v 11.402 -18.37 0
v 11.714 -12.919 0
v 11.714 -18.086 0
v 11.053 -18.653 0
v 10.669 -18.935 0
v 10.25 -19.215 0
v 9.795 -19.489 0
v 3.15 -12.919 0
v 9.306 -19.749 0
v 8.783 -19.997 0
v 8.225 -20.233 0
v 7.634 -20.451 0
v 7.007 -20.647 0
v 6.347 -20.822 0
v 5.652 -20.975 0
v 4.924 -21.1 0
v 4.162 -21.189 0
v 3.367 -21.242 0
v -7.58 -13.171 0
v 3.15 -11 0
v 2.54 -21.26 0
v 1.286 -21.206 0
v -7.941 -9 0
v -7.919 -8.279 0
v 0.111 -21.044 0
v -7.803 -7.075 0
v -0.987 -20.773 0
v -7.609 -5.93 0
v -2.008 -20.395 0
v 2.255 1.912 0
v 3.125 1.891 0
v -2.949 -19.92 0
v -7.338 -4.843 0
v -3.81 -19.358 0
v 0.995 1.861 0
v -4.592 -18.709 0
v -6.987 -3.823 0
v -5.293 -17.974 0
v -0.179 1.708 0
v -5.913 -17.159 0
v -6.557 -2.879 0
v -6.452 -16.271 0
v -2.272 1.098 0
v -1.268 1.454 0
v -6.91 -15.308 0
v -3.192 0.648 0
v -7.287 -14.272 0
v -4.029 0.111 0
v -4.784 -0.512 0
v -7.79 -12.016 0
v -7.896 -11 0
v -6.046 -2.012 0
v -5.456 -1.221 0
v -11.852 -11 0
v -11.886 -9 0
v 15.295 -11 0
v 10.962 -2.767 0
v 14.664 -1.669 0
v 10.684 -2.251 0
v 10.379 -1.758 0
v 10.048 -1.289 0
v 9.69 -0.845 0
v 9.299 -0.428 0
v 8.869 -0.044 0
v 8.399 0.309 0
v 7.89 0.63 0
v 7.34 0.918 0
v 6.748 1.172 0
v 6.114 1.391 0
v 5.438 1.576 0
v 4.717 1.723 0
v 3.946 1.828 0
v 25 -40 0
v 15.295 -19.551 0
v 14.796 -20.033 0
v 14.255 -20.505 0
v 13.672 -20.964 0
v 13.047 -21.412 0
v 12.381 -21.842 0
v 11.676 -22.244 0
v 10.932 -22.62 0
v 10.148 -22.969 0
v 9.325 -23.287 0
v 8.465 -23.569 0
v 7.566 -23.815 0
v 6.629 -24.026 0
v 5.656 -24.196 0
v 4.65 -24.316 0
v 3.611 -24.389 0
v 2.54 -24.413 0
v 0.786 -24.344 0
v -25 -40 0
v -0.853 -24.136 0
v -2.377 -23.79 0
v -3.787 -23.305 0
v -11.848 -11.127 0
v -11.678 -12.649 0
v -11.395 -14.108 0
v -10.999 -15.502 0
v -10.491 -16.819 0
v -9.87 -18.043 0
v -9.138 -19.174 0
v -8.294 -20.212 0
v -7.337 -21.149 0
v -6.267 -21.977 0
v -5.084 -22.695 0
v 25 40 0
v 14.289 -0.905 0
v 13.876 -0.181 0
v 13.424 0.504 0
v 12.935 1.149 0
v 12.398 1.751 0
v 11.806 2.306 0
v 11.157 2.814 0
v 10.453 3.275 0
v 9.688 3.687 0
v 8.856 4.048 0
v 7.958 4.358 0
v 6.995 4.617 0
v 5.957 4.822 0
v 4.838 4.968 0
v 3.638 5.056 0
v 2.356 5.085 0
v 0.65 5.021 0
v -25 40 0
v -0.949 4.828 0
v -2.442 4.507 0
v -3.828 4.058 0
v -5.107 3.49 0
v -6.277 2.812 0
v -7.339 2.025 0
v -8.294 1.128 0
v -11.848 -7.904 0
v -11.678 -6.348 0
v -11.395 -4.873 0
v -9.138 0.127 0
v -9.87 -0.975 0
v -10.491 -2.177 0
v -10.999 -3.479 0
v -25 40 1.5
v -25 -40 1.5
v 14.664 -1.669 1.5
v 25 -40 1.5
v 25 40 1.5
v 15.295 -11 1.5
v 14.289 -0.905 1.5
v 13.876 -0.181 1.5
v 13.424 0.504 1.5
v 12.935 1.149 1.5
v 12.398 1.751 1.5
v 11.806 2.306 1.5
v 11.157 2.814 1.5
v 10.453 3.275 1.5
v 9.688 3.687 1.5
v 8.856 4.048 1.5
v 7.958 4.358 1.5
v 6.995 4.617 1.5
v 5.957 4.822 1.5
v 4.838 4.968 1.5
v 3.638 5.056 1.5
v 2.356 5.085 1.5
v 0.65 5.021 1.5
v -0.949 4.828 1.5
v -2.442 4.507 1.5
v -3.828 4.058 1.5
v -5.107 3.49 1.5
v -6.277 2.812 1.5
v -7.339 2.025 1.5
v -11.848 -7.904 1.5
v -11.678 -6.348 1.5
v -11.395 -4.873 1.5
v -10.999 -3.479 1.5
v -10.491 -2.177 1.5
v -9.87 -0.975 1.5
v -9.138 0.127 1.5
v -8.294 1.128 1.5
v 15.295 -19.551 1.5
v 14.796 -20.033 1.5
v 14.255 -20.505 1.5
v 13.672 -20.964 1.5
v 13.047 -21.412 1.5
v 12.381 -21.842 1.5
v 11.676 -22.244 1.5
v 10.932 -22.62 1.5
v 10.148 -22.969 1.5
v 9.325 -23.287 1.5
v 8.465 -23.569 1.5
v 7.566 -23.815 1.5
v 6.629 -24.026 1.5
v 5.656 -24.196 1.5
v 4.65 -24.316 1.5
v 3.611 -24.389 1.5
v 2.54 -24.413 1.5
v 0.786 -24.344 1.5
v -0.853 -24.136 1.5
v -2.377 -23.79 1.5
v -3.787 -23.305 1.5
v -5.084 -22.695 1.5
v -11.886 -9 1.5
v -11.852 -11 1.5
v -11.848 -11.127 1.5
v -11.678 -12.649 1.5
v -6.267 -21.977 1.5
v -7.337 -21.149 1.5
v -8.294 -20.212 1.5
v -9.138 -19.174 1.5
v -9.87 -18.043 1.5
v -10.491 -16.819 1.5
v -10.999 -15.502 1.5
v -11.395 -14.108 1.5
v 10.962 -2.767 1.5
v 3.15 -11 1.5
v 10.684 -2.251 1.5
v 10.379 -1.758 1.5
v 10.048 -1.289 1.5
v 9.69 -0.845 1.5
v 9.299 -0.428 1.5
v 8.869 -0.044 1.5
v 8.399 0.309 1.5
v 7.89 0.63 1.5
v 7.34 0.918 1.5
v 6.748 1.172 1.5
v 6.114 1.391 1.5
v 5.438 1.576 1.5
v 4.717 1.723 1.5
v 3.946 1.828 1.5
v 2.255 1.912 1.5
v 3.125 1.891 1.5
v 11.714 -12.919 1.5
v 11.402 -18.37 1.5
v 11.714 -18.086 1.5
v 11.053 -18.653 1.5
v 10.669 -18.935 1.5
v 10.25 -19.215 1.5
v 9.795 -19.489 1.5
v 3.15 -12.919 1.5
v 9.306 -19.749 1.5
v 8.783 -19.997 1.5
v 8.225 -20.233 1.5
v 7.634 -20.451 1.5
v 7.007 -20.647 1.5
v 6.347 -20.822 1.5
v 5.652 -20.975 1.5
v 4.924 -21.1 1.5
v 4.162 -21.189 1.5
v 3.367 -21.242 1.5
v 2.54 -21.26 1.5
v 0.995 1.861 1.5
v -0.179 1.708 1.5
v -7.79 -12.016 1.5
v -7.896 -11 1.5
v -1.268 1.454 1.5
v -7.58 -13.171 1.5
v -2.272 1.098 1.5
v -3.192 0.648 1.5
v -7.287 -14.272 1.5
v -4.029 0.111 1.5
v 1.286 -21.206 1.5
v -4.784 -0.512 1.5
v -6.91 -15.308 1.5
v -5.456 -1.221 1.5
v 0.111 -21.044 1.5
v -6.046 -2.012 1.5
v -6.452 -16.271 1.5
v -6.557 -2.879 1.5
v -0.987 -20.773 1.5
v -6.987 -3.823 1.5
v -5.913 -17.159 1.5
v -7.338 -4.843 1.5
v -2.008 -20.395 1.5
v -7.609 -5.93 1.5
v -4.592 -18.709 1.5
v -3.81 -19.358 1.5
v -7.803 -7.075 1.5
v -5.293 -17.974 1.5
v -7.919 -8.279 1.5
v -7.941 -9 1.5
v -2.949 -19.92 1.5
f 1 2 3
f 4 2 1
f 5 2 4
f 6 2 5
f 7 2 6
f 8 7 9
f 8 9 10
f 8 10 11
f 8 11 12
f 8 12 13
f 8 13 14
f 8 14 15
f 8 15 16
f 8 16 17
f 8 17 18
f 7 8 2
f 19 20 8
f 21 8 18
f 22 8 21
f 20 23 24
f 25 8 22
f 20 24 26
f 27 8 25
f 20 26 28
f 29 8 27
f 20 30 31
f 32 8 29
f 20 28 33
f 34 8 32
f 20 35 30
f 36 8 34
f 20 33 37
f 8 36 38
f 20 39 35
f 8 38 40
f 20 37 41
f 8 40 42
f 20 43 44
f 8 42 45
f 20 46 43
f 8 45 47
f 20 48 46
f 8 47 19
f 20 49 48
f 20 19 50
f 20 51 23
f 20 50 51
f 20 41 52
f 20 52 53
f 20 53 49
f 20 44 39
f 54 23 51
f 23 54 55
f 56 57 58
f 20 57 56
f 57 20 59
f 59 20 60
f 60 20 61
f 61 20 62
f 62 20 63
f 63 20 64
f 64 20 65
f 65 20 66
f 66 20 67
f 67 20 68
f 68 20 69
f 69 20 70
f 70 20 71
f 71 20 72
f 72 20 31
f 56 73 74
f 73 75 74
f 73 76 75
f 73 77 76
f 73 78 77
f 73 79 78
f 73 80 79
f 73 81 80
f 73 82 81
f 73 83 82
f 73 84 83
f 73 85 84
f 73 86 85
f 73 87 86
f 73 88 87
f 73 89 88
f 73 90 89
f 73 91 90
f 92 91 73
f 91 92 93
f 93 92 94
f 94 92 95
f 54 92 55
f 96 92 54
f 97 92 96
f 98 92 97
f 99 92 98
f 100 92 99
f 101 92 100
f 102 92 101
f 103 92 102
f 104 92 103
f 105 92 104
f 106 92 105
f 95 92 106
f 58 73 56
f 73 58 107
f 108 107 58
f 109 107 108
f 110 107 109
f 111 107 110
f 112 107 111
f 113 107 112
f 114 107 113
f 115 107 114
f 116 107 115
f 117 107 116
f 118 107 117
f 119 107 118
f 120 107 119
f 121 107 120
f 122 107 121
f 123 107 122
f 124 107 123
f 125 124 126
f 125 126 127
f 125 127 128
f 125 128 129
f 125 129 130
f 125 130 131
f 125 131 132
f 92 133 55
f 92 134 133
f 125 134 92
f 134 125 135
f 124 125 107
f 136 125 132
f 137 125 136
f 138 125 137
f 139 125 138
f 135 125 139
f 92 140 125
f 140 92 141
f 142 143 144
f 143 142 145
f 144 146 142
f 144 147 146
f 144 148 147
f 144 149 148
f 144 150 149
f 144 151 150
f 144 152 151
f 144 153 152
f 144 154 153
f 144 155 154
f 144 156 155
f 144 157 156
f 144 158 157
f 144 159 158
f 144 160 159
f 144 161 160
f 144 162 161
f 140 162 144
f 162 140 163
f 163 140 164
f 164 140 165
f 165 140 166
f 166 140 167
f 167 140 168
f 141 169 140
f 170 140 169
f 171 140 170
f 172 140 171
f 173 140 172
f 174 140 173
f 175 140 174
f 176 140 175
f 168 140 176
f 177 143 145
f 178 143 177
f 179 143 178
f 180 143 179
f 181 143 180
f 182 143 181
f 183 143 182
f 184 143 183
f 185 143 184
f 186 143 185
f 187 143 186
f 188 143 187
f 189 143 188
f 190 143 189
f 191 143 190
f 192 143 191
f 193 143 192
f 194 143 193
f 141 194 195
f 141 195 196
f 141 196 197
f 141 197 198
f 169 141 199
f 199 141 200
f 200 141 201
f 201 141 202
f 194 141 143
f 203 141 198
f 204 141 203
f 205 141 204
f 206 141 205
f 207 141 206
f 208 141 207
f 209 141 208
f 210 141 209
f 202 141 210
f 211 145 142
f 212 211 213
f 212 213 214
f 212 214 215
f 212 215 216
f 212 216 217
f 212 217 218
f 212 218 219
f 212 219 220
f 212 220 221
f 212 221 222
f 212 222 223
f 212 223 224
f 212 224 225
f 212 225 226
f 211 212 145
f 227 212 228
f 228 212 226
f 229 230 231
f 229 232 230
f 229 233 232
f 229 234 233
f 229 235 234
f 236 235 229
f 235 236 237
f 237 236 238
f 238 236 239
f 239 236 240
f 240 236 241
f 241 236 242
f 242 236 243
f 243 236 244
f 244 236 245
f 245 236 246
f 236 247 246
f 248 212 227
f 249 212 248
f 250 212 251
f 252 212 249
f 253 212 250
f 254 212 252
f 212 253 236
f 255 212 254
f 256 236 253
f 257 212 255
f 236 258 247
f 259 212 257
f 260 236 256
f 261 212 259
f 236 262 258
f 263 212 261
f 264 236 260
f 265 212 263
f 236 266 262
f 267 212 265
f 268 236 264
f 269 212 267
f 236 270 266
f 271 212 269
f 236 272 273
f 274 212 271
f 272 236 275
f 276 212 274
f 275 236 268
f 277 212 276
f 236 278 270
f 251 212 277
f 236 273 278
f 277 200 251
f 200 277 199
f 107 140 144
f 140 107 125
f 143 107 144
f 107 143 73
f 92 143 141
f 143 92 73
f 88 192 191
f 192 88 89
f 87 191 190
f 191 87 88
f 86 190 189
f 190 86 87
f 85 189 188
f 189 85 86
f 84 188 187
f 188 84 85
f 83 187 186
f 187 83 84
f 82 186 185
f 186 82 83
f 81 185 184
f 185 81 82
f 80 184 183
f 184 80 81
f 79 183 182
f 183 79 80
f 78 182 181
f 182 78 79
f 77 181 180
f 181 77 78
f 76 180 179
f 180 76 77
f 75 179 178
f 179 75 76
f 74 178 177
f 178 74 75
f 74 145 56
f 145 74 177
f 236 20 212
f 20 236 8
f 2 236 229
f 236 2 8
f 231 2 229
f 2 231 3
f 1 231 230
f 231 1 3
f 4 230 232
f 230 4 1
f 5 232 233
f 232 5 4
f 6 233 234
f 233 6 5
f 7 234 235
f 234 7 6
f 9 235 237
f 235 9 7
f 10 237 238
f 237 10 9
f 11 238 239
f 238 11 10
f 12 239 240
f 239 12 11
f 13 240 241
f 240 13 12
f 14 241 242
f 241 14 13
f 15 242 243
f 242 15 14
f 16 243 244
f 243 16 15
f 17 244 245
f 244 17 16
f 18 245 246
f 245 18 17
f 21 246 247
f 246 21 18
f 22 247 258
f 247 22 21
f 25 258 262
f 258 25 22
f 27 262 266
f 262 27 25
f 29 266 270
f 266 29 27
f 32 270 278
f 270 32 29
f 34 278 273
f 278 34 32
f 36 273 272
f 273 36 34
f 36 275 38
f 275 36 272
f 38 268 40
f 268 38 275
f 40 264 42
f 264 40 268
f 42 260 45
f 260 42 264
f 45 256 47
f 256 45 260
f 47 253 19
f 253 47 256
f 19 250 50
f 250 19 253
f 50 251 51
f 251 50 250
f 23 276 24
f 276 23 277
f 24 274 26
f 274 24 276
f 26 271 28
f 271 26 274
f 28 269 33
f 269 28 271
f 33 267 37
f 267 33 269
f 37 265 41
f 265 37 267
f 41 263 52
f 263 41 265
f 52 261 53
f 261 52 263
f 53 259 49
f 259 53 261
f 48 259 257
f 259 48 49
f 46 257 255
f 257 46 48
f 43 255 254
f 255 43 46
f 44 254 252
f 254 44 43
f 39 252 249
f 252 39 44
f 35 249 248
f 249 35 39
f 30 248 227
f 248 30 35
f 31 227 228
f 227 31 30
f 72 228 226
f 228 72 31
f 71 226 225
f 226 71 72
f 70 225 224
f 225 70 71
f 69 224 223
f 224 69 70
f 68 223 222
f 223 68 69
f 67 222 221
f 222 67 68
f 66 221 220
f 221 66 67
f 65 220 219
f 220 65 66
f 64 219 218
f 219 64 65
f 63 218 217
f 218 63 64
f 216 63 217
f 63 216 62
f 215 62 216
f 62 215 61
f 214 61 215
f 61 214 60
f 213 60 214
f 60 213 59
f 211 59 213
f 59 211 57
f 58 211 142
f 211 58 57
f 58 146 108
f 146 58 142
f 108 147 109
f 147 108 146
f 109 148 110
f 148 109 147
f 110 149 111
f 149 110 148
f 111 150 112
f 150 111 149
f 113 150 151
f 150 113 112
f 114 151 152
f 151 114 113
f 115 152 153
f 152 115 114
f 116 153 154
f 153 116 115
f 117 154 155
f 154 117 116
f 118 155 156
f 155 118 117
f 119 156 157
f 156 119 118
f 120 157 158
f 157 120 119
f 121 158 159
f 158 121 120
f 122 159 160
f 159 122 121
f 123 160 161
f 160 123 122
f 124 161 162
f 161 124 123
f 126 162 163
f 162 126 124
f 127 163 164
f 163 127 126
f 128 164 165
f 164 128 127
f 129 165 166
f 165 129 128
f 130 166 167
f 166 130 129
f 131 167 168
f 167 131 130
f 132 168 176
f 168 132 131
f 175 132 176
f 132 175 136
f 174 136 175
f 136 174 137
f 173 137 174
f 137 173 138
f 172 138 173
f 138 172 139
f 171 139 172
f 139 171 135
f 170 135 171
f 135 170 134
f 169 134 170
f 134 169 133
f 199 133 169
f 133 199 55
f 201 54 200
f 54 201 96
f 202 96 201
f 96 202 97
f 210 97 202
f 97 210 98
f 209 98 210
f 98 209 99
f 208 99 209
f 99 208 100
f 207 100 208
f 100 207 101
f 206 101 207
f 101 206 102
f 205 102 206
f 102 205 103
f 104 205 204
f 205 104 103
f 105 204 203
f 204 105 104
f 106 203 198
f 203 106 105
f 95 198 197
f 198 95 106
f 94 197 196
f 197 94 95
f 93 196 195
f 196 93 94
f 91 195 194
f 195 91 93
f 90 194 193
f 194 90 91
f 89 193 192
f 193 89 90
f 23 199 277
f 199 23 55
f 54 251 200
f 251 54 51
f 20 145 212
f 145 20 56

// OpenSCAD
difference() {
    linear_extrude(height = 1.5)
        square(size = [50, 80], center = true);
    translate([-14, -10, 0]) linear_extrude(height = 1.5)
        text(text = str("G"), font = "Liberation Sans", size = 30, valign = "center");
}
translate([0, -10, 0])  linear_extrude(height = 1.5) square(size = [40, 2], center = true);
//translate([0, 0, 0])  linear_extrude(height = 1.5) square(size = [2, 80], center = true);
